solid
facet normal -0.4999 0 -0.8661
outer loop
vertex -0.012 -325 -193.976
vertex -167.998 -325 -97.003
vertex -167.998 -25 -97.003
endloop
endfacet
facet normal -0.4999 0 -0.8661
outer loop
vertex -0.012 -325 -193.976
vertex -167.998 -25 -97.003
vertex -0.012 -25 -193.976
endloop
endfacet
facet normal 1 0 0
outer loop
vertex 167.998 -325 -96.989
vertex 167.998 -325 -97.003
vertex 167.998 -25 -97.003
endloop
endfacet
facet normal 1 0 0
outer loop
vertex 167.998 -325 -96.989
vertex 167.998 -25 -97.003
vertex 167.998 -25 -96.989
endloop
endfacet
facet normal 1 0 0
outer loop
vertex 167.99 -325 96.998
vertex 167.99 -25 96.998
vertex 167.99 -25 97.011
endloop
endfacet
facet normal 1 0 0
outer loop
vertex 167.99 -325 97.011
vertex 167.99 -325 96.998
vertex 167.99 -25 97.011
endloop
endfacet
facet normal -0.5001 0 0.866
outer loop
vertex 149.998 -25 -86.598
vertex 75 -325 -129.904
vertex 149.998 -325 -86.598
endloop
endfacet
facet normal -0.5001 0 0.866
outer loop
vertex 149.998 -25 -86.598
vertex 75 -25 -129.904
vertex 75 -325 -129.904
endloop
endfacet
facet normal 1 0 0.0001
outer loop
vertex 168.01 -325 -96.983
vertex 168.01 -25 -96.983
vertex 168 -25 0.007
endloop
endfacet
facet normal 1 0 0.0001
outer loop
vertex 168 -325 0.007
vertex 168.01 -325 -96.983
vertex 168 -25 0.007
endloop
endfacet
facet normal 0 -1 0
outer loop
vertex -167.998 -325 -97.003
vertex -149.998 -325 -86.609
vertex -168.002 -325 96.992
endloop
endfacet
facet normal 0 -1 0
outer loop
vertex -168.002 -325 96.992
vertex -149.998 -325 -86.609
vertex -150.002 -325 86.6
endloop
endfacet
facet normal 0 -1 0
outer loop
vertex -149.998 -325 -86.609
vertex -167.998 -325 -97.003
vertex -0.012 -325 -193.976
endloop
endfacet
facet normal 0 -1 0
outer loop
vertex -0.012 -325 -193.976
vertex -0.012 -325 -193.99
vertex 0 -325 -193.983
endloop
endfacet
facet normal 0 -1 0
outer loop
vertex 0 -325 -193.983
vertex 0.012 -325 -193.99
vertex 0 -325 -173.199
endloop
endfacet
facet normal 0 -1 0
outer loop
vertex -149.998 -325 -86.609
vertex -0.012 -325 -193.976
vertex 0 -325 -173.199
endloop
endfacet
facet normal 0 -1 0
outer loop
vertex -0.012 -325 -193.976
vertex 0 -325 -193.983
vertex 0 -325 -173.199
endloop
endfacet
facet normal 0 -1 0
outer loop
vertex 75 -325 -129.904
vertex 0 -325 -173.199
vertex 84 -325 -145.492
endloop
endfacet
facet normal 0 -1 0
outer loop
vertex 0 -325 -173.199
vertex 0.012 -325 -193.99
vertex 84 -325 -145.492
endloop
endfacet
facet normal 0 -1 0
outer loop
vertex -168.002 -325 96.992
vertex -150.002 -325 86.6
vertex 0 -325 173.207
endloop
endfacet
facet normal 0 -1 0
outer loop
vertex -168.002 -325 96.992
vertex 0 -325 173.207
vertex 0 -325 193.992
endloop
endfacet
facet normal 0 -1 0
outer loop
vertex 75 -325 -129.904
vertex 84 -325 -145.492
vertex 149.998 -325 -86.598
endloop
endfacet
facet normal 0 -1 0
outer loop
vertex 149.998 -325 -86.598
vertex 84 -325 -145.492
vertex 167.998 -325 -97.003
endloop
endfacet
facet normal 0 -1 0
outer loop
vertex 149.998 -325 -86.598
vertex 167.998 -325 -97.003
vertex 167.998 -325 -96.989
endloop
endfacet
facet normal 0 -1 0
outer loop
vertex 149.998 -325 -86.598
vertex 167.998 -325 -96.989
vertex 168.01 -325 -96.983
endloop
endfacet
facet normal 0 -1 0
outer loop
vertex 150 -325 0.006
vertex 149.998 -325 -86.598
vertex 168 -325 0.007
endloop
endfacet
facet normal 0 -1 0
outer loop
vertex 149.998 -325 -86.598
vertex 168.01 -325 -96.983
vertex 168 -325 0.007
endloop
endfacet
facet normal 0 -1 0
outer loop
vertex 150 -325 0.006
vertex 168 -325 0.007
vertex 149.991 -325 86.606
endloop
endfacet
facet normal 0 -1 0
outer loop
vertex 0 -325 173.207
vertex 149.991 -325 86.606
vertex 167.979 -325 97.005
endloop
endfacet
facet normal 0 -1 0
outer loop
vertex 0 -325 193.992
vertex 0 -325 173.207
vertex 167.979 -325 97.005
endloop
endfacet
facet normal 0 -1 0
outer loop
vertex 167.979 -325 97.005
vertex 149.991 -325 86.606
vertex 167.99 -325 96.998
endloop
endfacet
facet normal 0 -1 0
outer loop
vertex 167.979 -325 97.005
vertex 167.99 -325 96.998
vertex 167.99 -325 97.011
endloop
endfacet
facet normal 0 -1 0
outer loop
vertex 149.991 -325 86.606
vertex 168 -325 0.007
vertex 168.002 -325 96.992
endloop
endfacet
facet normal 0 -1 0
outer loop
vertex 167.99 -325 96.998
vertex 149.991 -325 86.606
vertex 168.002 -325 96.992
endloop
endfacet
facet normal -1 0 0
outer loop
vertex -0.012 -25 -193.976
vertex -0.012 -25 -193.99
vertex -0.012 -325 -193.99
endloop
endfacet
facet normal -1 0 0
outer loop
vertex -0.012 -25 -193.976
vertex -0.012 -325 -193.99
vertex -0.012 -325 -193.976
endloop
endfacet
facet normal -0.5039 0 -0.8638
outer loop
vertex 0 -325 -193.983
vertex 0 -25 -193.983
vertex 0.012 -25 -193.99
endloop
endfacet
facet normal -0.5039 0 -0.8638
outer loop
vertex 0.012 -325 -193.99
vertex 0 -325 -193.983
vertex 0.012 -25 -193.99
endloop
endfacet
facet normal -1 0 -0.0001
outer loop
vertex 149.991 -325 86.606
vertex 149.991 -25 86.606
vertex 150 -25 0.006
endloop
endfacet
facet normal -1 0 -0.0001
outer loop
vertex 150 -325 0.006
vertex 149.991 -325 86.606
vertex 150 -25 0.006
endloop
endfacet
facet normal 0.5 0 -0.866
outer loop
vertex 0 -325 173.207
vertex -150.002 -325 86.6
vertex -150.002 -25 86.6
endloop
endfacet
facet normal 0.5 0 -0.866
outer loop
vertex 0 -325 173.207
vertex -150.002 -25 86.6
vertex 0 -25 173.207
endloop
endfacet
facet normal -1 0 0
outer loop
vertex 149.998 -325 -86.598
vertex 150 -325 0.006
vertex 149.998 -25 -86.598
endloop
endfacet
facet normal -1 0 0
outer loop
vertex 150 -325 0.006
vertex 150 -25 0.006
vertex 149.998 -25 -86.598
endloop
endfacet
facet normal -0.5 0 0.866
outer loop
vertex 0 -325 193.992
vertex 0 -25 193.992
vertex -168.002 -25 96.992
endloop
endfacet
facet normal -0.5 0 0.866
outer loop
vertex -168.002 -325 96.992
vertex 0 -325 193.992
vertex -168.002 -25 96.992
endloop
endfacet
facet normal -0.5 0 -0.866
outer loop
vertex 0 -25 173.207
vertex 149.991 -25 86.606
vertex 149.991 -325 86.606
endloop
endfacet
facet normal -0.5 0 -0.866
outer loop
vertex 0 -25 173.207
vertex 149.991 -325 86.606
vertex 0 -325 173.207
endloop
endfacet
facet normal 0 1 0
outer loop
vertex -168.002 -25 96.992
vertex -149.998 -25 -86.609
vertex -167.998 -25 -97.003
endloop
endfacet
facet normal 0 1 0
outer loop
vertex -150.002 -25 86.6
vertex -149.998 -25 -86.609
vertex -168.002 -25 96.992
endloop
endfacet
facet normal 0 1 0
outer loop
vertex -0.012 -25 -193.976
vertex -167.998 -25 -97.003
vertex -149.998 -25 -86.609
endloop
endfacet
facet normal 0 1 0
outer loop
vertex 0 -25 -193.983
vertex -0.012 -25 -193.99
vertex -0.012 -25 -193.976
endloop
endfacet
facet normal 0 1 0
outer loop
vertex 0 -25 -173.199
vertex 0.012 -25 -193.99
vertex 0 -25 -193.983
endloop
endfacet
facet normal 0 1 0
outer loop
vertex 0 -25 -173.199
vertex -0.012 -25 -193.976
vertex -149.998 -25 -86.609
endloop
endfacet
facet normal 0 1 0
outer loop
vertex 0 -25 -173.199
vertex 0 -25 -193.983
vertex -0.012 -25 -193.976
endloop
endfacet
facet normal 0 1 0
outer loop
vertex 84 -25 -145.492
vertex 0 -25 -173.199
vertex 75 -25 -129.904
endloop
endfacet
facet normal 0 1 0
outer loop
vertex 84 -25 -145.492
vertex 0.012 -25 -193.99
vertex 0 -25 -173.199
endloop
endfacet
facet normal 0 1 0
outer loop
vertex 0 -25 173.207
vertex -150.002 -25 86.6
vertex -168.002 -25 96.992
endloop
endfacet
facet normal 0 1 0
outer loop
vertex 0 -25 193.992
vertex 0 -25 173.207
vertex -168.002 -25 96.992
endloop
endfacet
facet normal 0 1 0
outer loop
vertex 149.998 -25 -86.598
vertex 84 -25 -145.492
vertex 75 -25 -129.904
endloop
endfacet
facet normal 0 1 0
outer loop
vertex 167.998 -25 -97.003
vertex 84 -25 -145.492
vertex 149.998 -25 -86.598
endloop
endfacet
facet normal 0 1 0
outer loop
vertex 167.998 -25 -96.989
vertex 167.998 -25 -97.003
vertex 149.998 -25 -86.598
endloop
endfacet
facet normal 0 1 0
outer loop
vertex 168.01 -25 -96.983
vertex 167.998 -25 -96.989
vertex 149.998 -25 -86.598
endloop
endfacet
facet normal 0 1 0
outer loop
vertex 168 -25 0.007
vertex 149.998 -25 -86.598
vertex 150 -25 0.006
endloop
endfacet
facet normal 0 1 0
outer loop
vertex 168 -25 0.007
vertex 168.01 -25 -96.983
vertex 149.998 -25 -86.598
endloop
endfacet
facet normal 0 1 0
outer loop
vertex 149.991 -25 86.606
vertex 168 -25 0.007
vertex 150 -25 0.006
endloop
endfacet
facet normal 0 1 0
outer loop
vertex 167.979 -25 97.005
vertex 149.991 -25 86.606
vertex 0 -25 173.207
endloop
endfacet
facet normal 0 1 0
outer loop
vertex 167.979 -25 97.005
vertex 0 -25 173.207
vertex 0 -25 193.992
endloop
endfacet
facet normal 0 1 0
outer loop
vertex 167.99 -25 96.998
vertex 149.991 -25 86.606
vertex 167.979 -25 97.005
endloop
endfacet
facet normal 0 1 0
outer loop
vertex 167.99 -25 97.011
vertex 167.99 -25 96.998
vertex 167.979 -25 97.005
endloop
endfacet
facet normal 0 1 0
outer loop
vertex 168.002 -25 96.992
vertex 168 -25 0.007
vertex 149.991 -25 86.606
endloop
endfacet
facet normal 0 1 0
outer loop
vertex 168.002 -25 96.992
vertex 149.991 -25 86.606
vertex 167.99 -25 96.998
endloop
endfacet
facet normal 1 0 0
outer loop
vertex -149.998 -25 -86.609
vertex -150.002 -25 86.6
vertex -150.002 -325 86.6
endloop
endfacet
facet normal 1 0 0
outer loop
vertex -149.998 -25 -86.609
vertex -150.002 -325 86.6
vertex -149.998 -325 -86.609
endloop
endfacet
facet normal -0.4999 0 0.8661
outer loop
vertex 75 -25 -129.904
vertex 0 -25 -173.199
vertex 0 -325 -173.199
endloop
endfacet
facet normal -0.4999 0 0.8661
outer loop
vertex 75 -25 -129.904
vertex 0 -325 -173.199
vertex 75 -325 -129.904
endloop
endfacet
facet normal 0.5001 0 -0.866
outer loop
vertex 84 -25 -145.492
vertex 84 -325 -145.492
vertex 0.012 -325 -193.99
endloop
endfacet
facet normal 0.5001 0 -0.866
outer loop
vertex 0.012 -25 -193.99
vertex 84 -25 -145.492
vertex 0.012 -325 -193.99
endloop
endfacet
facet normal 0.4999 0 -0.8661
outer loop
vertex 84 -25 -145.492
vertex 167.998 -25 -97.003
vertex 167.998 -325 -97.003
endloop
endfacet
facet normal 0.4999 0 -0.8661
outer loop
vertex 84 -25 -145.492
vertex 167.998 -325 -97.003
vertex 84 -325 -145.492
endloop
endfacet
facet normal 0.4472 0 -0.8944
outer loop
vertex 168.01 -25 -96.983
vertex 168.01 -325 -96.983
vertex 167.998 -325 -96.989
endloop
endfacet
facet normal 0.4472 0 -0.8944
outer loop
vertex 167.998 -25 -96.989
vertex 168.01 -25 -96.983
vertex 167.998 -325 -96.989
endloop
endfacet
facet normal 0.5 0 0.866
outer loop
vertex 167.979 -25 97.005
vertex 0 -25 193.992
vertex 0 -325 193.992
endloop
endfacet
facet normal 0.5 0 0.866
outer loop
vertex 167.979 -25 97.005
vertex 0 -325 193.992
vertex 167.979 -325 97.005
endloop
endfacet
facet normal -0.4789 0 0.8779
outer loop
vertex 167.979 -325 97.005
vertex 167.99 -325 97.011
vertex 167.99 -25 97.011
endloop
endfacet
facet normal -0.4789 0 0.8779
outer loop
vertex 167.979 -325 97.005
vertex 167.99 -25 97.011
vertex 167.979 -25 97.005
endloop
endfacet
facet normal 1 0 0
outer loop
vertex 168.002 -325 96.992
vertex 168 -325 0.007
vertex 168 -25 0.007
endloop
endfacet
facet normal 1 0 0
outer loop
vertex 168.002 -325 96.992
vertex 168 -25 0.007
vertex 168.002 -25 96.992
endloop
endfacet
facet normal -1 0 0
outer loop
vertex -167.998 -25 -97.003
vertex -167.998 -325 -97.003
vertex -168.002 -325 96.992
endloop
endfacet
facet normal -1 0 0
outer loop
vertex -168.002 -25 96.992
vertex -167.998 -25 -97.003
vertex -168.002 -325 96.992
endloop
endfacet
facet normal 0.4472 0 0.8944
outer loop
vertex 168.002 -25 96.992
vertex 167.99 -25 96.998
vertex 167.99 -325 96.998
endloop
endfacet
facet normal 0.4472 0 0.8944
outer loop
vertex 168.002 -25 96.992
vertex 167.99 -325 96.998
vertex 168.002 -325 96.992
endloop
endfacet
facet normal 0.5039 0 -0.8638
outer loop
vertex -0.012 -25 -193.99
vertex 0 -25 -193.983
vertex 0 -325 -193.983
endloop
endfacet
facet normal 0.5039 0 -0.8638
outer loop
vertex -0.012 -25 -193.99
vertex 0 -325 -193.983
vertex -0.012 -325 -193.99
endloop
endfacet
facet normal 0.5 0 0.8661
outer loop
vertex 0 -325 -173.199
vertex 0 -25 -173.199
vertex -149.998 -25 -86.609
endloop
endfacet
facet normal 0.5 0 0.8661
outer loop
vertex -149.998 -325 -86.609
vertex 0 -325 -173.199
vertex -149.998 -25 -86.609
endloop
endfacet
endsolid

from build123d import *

# Parameters (mm, degrees)
F4_DEPTH = 300


with BuildPart() as f4:
    # F3 (on offset) → F4 (new body)
    with BuildSketch(Plane.XZ.offset(25)):
        Polygon((-168.0019225023, 96.9915152759), (-150.0017165199, 86.5995672107), (0, 173.2070629141), (0, 193.9919104638), align=None)
    extrude(amount=F4_DEPTH)

    # F5: F4 across face


with BuildPart() as f4_1:
    add(f4.part)
    add(f4.part.mirror(Plane(origin=(0, -175, 183.599486689), x_dir=(0, 1, 0), z_dir=(1, 0, 0))))

    # F6: F4 across face


with BuildPart() as f4_2:
    add(f4_1.part)
    add(f4_1.part.mirror(Plane(origin=(159.0018195111, -175, 91.7955412433), x_dir=(0, 1, 0), z_dir=(0.4999828344, 0, -0.8660353141))))

    # F7: F4 across face


with BuildPart() as f4_3:
    add(f4_2.part)
    add(f4_2.part.mirror(Plane(origin=(-159.0018195111, -175, 91.7955412433), x_dir=(0, -1, 0), z_dir=(-0.4999828344, 0, -0.8660353141))))


solid = f4_3.part
